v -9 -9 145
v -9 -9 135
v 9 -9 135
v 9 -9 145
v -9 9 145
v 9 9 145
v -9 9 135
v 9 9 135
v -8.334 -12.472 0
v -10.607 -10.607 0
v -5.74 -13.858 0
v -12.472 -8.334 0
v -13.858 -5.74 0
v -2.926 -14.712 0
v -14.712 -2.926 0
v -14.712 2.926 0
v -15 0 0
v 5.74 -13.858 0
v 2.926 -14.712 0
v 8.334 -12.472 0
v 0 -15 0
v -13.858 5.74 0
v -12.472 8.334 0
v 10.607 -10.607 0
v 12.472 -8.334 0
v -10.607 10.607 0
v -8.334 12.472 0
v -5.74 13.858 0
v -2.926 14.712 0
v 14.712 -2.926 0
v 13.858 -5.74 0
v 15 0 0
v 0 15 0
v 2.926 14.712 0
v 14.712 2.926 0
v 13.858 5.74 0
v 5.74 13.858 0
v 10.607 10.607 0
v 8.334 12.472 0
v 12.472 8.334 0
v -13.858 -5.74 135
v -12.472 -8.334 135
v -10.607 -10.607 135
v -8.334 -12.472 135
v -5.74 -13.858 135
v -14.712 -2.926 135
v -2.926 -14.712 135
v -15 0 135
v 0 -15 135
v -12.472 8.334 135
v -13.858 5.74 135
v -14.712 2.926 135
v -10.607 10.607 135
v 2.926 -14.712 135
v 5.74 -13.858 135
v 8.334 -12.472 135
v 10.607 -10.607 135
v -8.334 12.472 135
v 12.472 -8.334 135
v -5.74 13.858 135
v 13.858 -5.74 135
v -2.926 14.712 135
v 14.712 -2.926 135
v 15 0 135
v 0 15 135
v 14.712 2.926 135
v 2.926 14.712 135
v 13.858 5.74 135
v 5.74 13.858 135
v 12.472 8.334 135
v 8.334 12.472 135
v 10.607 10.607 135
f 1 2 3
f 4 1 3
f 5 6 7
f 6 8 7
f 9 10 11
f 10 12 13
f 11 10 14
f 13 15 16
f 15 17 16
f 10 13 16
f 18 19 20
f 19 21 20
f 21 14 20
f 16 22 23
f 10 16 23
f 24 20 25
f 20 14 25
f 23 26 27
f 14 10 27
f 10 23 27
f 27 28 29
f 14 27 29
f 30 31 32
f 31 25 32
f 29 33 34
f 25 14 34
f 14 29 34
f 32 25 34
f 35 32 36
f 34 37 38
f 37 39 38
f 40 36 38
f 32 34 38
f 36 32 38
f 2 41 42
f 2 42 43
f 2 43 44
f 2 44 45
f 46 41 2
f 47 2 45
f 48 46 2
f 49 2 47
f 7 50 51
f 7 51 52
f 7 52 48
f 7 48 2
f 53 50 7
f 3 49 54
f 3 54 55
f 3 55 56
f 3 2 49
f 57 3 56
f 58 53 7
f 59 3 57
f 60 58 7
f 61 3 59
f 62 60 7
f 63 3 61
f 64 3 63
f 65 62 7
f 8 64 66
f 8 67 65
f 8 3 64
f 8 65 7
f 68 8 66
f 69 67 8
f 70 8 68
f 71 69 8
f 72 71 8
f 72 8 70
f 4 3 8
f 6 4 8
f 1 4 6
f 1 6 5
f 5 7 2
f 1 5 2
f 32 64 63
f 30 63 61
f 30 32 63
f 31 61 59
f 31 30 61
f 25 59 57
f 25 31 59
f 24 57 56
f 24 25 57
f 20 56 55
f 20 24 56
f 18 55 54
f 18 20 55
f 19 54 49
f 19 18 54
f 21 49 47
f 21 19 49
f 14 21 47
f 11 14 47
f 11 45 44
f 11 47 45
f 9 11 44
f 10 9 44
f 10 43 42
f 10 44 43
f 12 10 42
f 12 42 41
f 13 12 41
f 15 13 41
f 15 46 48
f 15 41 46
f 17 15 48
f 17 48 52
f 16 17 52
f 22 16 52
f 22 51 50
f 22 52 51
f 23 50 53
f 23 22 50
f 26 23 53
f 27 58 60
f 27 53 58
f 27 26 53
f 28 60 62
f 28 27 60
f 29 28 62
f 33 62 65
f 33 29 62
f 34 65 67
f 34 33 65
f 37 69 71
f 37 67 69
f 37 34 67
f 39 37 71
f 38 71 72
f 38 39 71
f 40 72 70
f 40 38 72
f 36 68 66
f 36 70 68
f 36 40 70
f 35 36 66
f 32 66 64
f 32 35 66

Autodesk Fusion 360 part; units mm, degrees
sketch "Sketch1" plane through (0, 0, 0) normal (1, 0, 0) x (0, 1, 0)
sketch "Sketch2" plane through (0, 0, 0) normal (0, 0, 1) x (1, 0, 0)
  circle A0 centre (0, 0) radius 15
  dimension "d1" = 30
extrude "Extrude1" add sketch "Sketch2" along normal blind 135
sketch "Sketch3" plane through (0, 0, 135) normal (0, 0, 1) x (-1, 0, 0)
  circle A0 centre (0, 0) radius 15
  line L0 (9, 9) -> (-9, 9)
  line L1 (-9, 9) -> (-9, -9)
  line L2 (-9, -9) -> (9, -9)
  line L3 (9, -9) -> (9, 9)
  line L4 (9, 9) -> (-9, -9) construction
  line L5 (-9, 9) -> (9, -9) construction
  dimension "d4" = 18
  dimension "d5" = 18
extrude "Extrude2" add sketch "Sketch3" along normal blind 10 contours L0 L1 L2 L3
fillet "Fillet1" radius 5 1 edges at (-13.9849, -5.4242, 0)
delete_face "DeleteFace1" 1 faces at (14.8356, -1.4845, 4.0537)
